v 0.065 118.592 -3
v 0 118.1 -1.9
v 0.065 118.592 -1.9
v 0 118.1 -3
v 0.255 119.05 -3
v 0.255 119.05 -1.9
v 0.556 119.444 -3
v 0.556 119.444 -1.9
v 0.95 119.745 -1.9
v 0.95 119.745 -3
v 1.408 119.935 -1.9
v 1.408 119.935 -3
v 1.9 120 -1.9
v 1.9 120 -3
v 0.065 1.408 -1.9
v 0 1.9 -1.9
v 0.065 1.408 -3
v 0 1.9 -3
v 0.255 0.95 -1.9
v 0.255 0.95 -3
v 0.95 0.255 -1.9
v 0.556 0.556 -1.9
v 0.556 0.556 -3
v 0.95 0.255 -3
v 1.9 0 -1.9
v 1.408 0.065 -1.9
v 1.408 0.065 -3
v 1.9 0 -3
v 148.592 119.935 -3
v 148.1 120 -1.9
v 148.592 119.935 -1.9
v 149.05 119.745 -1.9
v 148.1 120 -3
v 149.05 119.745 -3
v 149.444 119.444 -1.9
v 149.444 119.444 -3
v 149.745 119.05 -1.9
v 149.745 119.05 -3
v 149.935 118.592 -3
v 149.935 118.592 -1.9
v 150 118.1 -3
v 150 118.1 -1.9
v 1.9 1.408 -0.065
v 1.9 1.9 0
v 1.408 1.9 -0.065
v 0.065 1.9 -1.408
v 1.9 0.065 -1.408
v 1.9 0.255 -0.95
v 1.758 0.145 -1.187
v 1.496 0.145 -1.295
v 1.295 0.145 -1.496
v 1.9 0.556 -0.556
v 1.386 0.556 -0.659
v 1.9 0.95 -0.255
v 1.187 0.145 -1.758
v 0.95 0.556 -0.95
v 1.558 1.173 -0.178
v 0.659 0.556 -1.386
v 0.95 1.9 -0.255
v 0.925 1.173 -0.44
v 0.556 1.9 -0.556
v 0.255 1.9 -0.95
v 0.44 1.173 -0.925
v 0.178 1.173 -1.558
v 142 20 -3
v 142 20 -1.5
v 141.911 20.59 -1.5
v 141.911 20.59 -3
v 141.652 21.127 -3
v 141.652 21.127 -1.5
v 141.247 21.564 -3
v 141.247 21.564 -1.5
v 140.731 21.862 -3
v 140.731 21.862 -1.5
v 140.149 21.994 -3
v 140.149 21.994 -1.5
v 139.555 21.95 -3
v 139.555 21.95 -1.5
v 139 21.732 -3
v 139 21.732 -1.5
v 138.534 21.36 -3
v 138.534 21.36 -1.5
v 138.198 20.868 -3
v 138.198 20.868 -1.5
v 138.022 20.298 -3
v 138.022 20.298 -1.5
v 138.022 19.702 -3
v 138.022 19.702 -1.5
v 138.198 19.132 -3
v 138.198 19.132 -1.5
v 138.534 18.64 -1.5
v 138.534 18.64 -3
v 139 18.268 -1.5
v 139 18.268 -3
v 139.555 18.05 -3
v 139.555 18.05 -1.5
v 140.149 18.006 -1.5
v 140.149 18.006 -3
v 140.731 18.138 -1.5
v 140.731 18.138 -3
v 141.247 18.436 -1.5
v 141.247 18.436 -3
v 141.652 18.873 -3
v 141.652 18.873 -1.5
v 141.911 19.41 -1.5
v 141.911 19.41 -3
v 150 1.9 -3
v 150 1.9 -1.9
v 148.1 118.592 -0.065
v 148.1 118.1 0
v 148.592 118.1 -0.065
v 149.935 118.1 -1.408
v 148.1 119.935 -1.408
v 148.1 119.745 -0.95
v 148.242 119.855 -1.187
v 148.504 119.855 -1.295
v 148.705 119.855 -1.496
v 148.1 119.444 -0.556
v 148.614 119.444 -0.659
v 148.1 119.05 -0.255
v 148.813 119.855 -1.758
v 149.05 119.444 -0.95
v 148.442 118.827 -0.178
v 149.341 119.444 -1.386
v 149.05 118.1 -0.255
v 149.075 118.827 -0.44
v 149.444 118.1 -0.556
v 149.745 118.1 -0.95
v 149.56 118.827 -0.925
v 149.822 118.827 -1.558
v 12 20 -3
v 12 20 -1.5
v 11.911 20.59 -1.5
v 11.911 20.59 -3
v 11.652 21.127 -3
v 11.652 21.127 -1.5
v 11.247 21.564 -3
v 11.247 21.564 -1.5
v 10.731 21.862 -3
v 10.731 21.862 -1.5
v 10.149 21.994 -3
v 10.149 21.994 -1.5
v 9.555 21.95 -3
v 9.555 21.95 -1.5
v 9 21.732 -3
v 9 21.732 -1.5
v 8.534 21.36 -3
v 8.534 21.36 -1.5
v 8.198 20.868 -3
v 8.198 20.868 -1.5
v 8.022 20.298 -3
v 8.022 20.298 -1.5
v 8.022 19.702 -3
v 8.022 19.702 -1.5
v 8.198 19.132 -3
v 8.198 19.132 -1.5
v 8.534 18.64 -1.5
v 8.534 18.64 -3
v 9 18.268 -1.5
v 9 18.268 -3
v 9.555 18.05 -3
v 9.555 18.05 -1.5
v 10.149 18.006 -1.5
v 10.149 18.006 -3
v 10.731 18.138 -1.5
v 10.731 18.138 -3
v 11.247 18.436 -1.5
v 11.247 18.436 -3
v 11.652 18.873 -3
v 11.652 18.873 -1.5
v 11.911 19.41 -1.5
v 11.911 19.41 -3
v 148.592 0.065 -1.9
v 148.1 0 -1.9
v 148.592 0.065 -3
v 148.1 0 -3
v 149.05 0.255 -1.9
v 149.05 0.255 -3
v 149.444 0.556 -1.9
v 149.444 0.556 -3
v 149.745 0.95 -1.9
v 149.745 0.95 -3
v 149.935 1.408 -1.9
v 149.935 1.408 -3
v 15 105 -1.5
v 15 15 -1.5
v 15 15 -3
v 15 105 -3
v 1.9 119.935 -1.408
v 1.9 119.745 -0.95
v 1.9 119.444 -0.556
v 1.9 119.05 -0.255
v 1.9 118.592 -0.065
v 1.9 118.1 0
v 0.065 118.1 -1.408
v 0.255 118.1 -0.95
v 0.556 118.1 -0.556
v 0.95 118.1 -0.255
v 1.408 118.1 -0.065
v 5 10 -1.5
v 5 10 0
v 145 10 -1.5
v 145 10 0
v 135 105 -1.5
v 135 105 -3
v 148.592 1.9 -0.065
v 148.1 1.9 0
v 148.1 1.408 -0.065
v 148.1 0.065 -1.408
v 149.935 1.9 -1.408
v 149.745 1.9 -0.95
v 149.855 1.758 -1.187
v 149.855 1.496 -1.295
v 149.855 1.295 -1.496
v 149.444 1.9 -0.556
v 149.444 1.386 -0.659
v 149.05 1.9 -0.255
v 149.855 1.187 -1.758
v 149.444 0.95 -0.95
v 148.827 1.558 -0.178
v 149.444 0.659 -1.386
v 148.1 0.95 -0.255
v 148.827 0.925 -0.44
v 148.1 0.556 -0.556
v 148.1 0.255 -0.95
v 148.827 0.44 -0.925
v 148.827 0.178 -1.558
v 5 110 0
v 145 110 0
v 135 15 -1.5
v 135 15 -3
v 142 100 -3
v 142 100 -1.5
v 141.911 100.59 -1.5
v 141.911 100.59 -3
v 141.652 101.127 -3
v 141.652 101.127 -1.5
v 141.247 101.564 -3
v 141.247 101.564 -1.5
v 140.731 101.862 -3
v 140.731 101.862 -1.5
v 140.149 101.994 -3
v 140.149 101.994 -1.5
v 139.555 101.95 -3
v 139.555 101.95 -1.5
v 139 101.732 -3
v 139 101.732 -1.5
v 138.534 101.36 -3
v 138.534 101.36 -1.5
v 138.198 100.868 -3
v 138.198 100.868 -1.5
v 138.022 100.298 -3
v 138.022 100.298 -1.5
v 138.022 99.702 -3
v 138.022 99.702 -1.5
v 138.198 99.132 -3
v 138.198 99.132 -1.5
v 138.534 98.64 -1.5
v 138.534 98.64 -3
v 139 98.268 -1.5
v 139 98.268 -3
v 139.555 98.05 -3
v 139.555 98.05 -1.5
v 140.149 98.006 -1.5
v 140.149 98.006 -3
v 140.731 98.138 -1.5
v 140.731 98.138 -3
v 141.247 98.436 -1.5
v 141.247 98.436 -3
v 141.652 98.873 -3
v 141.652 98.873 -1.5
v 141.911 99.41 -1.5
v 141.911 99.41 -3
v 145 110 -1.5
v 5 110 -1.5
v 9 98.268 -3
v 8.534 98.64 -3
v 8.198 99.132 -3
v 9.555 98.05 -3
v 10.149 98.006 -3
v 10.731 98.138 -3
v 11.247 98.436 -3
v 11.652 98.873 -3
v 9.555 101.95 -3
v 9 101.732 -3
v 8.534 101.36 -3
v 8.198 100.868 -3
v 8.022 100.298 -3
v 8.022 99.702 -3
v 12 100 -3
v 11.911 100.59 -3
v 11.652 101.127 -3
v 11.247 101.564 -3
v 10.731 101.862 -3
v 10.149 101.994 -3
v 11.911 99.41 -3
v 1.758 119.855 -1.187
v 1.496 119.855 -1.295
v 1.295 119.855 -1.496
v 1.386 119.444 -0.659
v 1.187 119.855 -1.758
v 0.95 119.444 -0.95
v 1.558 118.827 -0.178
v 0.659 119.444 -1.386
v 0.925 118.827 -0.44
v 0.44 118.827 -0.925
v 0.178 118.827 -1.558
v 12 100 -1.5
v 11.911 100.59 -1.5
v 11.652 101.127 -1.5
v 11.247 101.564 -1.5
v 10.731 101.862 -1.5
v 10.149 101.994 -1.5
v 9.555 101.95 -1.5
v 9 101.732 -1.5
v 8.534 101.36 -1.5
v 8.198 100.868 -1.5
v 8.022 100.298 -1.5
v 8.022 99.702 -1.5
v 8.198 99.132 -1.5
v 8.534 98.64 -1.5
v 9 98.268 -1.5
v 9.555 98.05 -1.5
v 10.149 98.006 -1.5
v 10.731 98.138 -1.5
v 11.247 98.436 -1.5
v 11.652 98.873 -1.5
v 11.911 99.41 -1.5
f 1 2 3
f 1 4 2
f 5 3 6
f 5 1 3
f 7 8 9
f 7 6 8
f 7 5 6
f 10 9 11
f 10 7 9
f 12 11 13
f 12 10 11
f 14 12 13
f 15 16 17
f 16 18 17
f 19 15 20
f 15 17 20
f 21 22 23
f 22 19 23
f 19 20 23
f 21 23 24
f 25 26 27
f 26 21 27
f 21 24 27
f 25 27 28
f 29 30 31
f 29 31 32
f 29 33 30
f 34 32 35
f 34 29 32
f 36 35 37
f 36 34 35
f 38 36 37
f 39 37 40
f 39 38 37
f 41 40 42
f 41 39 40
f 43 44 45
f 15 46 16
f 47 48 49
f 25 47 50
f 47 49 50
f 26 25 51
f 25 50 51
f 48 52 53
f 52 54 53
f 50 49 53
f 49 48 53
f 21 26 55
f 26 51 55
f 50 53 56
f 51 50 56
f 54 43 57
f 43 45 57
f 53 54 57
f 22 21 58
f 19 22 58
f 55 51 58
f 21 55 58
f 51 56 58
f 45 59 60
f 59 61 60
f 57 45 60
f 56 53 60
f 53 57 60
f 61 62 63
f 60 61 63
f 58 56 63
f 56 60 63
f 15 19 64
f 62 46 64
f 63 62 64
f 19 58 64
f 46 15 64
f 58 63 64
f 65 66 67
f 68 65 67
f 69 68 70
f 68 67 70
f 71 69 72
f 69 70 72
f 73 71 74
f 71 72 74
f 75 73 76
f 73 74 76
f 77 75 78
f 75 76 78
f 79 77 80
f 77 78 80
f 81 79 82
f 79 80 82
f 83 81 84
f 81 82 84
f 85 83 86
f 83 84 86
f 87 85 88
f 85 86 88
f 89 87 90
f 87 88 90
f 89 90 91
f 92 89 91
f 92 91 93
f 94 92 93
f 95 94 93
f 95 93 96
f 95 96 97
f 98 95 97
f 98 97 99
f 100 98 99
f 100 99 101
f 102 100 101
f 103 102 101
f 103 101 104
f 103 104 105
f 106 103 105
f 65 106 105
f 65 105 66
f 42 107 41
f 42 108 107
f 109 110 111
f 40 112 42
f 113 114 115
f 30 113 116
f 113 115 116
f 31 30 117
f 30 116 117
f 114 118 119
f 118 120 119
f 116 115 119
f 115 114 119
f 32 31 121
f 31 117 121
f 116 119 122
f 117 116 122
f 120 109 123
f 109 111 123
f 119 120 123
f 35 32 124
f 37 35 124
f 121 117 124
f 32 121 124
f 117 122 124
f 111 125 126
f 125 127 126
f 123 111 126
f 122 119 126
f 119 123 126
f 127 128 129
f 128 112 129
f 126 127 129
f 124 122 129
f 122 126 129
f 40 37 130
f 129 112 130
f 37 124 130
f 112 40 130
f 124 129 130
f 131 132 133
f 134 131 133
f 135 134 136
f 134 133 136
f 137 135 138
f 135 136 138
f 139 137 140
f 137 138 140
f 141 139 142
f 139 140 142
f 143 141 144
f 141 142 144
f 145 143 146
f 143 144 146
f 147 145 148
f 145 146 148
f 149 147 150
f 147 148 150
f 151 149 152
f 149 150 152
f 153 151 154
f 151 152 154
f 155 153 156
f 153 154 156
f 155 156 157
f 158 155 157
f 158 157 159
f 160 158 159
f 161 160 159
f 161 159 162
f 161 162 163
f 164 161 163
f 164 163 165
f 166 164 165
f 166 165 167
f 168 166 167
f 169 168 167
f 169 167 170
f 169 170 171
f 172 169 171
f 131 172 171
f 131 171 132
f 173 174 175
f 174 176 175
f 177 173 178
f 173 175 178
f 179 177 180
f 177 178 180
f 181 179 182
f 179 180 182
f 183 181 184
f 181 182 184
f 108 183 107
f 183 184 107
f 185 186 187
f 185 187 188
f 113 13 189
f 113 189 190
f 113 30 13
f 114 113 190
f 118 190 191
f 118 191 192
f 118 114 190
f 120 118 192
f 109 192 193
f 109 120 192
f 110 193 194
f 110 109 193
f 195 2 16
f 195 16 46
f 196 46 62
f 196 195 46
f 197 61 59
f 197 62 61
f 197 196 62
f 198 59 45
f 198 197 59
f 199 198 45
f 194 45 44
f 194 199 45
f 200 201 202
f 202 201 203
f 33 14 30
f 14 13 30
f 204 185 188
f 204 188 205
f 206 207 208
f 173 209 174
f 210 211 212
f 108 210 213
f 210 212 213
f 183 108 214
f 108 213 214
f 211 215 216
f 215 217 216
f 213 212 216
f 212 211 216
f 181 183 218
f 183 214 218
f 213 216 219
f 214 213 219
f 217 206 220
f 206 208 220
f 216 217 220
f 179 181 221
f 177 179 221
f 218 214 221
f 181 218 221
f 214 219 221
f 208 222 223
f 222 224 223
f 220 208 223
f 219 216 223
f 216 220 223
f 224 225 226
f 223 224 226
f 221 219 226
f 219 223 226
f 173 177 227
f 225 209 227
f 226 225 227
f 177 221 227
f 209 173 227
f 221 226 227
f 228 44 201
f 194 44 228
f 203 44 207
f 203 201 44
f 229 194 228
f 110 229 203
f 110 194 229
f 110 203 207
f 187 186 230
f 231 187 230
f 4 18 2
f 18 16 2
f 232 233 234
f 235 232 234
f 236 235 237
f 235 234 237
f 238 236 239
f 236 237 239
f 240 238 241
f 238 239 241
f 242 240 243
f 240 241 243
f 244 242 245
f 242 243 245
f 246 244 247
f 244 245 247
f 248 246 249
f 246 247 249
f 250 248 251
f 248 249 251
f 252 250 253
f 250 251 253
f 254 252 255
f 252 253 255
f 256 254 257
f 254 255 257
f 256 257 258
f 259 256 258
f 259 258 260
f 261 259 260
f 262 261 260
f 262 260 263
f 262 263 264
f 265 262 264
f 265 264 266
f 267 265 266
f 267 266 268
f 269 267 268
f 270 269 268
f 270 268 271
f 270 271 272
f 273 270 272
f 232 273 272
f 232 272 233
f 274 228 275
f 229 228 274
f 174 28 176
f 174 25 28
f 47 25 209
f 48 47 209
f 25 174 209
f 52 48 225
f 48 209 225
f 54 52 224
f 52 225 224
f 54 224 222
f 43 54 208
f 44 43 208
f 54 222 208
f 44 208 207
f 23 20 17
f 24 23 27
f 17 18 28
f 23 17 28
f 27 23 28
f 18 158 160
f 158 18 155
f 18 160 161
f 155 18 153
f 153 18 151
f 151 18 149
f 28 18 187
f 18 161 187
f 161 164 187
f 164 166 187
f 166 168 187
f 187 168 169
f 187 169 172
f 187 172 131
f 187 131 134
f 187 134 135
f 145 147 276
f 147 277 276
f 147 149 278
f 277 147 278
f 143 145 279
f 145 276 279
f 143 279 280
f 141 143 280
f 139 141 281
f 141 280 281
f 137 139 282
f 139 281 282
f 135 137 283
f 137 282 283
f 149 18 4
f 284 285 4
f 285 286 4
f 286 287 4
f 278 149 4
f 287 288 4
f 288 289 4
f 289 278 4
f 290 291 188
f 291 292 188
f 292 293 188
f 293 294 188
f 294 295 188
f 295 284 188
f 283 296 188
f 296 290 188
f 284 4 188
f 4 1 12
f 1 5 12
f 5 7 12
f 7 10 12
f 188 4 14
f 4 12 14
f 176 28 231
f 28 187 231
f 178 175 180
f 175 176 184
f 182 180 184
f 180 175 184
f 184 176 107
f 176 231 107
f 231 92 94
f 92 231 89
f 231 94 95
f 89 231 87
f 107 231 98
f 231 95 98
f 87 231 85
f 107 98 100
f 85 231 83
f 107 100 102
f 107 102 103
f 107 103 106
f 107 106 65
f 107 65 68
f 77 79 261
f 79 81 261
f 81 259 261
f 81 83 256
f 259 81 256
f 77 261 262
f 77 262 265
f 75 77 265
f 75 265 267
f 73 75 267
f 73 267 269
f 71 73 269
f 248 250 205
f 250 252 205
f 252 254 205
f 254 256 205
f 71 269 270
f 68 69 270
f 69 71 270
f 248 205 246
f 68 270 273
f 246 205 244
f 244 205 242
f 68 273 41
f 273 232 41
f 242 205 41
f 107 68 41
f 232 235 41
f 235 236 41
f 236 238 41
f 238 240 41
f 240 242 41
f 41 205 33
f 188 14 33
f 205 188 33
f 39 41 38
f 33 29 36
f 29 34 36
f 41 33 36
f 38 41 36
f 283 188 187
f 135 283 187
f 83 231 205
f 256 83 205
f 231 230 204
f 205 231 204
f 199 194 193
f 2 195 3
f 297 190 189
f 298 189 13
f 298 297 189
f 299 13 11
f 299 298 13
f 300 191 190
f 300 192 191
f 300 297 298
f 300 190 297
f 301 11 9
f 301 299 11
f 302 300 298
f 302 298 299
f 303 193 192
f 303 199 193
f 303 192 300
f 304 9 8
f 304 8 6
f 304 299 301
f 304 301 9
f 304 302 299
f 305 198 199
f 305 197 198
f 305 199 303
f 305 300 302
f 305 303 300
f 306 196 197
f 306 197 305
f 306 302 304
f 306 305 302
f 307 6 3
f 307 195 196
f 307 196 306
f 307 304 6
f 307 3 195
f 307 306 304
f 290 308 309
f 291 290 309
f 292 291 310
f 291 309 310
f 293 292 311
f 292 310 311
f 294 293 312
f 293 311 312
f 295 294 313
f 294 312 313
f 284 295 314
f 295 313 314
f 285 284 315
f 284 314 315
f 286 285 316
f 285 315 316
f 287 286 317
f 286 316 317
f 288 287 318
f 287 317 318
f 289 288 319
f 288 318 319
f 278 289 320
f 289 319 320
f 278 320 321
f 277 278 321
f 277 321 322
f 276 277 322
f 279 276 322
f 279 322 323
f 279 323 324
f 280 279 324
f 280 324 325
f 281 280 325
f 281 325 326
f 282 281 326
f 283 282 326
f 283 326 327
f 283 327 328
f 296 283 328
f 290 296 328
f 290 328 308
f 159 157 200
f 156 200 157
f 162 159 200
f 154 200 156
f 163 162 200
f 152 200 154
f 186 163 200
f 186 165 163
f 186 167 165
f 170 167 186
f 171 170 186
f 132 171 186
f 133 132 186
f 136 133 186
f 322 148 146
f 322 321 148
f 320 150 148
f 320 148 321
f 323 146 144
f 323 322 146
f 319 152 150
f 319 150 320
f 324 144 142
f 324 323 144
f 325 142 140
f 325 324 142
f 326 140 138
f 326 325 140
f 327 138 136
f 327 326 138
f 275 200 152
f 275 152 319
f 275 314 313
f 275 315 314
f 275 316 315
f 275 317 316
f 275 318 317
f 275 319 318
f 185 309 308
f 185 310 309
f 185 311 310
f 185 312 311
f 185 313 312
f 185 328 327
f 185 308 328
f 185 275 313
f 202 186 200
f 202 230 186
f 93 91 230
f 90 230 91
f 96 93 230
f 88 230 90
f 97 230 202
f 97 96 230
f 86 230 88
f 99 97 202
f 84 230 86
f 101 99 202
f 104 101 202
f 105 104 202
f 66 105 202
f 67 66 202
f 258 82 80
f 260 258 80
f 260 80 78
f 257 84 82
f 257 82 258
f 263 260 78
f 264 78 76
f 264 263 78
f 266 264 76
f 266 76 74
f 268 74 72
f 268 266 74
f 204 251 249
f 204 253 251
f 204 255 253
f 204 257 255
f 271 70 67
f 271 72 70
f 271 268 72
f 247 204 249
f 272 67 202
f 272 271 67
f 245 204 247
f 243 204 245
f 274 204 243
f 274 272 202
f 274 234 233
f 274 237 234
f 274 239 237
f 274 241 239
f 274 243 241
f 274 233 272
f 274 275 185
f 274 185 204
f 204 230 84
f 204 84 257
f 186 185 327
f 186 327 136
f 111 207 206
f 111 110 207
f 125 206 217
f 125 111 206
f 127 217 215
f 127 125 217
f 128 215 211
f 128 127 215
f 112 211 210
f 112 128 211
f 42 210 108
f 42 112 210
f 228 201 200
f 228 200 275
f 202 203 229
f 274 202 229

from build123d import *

# Parameters (mm, degrees)
SKETCH_W        = 150
SKETCH_H        = 120
PAD_DEPTH       = 3
SKETCH002_W     = 120
SKETCH002_H     = 90
POCKET_DEPTH    = 5
SKETCH001_W     = 140
SKETCH001_H     = 100
POCKET001_DEPTH = 1.5
SKETCH003_R     = 2
POCKET002_DEPTH = 5
SKETCH004_R     = 2
POCKET003_DEPTH = 5
SKETCH005_R     = 2
POCKET004_DEPTH = 5
SKETCH006_R     = 2
POCKET005_DEPTH = 5
FILLET_R        = 1.9


with BuildPart() as part:
    # Sketch → Pad (new body)
    with BuildSketch(Plane.XY):
        with Locations((75, 60)):
            Rectangle(SKETCH_W, SKETCH_H)
    extrude(amount=-PAD_DEPTH)

    # Sketch002 → Pocket (cut)
    with BuildSketch(Plane.XY):
        with Locations((75, 60)):
            Rectangle(SKETCH002_W, SKETCH002_H)
    extrude(amount=-POCKET_DEPTH, mode=Mode.SUBTRACT)

    # Sketch001 → Pocket001 (cut)
    with BuildSketch(Plane.XY):
        with Locations((75, 60)):
            Rectangle(SKETCH001_W, SKETCH001_H)
    extrude(amount=-POCKET001_DEPTH, mode=Mode.SUBTRACT)

    # Sketch003 → Pocket002 (cut)
    with BuildSketch(Plane.XY):
        with Locations((10, 20)):
            Circle(SKETCH003_R)
    extrude(amount=-POCKET002_DEPTH, mode=Mode.SUBTRACT)

    # Sketch004 → Pocket003 (cut)
    with BuildSketch(Plane.XY):
        with Locations((10, 100)):
            Circle(SKETCH004_R)
    extrude(amount=-POCKET003_DEPTH, mode=Mode.SUBTRACT)

    # Sketch005 → Pocket004 (cut)
    with BuildSketch(Plane.XY):
        with Locations((140, 20)):
            Circle(SKETCH005_R)
    extrude(amount=-POCKET004_DEPTH, mode=Mode.SUBTRACT)

    # Sketch006 → Pocket005 (cut)
    with BuildSketch(Plane.XY):
        with Locations((140, 100)):
            Circle(SKETCH006_R)
    extrude(amount=-POCKET005_DEPTH, mode=Mode.SUBTRACT)

    # Fillet
    fillet_edges = [part.edges().sort_by_distance(p)[0] for p in [
        (0, 60, 0),
        (75, 0, 0),
        (150, 60, 0),
        (75, 120, 0),
        (0, 0, -1.5),
        (150, 0, -1.5),
        (150, 120, -1.5),
        (0, 120, -1.5),
    ]]
    fillet(fillet_edges, radius=FILLET_R)


solid = part.part
